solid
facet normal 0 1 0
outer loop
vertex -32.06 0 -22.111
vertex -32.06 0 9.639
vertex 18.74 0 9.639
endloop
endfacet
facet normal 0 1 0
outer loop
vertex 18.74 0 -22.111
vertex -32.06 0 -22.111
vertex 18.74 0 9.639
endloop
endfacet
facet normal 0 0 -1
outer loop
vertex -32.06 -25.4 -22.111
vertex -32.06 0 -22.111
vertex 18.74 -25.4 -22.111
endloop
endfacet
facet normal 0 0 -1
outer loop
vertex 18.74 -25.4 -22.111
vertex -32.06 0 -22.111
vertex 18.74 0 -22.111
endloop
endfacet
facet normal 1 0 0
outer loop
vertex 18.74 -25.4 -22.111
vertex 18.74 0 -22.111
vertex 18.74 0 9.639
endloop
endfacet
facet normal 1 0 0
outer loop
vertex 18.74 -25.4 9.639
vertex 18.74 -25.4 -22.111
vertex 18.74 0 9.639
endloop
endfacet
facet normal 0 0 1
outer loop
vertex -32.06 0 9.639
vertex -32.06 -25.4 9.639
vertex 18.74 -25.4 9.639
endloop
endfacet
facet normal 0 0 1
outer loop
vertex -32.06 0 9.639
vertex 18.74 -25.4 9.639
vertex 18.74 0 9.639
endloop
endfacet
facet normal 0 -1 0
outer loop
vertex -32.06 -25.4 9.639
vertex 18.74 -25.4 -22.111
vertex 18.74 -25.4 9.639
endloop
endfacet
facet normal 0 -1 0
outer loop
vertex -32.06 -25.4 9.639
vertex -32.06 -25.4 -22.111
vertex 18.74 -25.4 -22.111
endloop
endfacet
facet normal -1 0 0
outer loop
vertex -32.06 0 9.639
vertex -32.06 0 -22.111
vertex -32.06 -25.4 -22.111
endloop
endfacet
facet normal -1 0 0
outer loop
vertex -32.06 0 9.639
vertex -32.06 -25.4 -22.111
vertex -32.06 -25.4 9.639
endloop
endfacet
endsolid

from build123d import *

# Parameters (mm, degrees)
F0_W      = 50.8
F0_H      = 31.75
F1_DEPTH  = 25.4
F2_W      = 12.7
F2_H      = 21.27206
F3_DEPTH  = 50.8
F3_FACE_W = 12.7
F3_FACE_H = 21.27206
F4_DEPTH  = 50.8


with BuildPart() as f1:
    # F0 (on Front) → F1 (new body)
    with BuildSketch(Plane.XZ):
        with Locations((-6.660153, -6.235599)):
            Rectangle(F0_W, F0_H)
    extrude(amount=F1_DEPTH)

    # F2 (on face) → F3 (join)
    with BuildSketch(Plane.YZ.offset(18.739847)):
        with Locations((-19.05, -0.996629)):
            Rectangle(F2_W, F2_H)
    extrude(amount=F3_DEPTH)

    # F3_face (on face) → F4 (cut)
    with BuildSketch(Plane(origin=(69.539847, -19.05, -0.996629), x_dir=(0, 1, 0), z_dir=(1, 0, 0))):
        Rectangle(F3_FACE_W, F3_FACE_H)
    extrude(amount=-F4_DEPTH, mode=Mode.SUBTRACT)


solid = f1.part
